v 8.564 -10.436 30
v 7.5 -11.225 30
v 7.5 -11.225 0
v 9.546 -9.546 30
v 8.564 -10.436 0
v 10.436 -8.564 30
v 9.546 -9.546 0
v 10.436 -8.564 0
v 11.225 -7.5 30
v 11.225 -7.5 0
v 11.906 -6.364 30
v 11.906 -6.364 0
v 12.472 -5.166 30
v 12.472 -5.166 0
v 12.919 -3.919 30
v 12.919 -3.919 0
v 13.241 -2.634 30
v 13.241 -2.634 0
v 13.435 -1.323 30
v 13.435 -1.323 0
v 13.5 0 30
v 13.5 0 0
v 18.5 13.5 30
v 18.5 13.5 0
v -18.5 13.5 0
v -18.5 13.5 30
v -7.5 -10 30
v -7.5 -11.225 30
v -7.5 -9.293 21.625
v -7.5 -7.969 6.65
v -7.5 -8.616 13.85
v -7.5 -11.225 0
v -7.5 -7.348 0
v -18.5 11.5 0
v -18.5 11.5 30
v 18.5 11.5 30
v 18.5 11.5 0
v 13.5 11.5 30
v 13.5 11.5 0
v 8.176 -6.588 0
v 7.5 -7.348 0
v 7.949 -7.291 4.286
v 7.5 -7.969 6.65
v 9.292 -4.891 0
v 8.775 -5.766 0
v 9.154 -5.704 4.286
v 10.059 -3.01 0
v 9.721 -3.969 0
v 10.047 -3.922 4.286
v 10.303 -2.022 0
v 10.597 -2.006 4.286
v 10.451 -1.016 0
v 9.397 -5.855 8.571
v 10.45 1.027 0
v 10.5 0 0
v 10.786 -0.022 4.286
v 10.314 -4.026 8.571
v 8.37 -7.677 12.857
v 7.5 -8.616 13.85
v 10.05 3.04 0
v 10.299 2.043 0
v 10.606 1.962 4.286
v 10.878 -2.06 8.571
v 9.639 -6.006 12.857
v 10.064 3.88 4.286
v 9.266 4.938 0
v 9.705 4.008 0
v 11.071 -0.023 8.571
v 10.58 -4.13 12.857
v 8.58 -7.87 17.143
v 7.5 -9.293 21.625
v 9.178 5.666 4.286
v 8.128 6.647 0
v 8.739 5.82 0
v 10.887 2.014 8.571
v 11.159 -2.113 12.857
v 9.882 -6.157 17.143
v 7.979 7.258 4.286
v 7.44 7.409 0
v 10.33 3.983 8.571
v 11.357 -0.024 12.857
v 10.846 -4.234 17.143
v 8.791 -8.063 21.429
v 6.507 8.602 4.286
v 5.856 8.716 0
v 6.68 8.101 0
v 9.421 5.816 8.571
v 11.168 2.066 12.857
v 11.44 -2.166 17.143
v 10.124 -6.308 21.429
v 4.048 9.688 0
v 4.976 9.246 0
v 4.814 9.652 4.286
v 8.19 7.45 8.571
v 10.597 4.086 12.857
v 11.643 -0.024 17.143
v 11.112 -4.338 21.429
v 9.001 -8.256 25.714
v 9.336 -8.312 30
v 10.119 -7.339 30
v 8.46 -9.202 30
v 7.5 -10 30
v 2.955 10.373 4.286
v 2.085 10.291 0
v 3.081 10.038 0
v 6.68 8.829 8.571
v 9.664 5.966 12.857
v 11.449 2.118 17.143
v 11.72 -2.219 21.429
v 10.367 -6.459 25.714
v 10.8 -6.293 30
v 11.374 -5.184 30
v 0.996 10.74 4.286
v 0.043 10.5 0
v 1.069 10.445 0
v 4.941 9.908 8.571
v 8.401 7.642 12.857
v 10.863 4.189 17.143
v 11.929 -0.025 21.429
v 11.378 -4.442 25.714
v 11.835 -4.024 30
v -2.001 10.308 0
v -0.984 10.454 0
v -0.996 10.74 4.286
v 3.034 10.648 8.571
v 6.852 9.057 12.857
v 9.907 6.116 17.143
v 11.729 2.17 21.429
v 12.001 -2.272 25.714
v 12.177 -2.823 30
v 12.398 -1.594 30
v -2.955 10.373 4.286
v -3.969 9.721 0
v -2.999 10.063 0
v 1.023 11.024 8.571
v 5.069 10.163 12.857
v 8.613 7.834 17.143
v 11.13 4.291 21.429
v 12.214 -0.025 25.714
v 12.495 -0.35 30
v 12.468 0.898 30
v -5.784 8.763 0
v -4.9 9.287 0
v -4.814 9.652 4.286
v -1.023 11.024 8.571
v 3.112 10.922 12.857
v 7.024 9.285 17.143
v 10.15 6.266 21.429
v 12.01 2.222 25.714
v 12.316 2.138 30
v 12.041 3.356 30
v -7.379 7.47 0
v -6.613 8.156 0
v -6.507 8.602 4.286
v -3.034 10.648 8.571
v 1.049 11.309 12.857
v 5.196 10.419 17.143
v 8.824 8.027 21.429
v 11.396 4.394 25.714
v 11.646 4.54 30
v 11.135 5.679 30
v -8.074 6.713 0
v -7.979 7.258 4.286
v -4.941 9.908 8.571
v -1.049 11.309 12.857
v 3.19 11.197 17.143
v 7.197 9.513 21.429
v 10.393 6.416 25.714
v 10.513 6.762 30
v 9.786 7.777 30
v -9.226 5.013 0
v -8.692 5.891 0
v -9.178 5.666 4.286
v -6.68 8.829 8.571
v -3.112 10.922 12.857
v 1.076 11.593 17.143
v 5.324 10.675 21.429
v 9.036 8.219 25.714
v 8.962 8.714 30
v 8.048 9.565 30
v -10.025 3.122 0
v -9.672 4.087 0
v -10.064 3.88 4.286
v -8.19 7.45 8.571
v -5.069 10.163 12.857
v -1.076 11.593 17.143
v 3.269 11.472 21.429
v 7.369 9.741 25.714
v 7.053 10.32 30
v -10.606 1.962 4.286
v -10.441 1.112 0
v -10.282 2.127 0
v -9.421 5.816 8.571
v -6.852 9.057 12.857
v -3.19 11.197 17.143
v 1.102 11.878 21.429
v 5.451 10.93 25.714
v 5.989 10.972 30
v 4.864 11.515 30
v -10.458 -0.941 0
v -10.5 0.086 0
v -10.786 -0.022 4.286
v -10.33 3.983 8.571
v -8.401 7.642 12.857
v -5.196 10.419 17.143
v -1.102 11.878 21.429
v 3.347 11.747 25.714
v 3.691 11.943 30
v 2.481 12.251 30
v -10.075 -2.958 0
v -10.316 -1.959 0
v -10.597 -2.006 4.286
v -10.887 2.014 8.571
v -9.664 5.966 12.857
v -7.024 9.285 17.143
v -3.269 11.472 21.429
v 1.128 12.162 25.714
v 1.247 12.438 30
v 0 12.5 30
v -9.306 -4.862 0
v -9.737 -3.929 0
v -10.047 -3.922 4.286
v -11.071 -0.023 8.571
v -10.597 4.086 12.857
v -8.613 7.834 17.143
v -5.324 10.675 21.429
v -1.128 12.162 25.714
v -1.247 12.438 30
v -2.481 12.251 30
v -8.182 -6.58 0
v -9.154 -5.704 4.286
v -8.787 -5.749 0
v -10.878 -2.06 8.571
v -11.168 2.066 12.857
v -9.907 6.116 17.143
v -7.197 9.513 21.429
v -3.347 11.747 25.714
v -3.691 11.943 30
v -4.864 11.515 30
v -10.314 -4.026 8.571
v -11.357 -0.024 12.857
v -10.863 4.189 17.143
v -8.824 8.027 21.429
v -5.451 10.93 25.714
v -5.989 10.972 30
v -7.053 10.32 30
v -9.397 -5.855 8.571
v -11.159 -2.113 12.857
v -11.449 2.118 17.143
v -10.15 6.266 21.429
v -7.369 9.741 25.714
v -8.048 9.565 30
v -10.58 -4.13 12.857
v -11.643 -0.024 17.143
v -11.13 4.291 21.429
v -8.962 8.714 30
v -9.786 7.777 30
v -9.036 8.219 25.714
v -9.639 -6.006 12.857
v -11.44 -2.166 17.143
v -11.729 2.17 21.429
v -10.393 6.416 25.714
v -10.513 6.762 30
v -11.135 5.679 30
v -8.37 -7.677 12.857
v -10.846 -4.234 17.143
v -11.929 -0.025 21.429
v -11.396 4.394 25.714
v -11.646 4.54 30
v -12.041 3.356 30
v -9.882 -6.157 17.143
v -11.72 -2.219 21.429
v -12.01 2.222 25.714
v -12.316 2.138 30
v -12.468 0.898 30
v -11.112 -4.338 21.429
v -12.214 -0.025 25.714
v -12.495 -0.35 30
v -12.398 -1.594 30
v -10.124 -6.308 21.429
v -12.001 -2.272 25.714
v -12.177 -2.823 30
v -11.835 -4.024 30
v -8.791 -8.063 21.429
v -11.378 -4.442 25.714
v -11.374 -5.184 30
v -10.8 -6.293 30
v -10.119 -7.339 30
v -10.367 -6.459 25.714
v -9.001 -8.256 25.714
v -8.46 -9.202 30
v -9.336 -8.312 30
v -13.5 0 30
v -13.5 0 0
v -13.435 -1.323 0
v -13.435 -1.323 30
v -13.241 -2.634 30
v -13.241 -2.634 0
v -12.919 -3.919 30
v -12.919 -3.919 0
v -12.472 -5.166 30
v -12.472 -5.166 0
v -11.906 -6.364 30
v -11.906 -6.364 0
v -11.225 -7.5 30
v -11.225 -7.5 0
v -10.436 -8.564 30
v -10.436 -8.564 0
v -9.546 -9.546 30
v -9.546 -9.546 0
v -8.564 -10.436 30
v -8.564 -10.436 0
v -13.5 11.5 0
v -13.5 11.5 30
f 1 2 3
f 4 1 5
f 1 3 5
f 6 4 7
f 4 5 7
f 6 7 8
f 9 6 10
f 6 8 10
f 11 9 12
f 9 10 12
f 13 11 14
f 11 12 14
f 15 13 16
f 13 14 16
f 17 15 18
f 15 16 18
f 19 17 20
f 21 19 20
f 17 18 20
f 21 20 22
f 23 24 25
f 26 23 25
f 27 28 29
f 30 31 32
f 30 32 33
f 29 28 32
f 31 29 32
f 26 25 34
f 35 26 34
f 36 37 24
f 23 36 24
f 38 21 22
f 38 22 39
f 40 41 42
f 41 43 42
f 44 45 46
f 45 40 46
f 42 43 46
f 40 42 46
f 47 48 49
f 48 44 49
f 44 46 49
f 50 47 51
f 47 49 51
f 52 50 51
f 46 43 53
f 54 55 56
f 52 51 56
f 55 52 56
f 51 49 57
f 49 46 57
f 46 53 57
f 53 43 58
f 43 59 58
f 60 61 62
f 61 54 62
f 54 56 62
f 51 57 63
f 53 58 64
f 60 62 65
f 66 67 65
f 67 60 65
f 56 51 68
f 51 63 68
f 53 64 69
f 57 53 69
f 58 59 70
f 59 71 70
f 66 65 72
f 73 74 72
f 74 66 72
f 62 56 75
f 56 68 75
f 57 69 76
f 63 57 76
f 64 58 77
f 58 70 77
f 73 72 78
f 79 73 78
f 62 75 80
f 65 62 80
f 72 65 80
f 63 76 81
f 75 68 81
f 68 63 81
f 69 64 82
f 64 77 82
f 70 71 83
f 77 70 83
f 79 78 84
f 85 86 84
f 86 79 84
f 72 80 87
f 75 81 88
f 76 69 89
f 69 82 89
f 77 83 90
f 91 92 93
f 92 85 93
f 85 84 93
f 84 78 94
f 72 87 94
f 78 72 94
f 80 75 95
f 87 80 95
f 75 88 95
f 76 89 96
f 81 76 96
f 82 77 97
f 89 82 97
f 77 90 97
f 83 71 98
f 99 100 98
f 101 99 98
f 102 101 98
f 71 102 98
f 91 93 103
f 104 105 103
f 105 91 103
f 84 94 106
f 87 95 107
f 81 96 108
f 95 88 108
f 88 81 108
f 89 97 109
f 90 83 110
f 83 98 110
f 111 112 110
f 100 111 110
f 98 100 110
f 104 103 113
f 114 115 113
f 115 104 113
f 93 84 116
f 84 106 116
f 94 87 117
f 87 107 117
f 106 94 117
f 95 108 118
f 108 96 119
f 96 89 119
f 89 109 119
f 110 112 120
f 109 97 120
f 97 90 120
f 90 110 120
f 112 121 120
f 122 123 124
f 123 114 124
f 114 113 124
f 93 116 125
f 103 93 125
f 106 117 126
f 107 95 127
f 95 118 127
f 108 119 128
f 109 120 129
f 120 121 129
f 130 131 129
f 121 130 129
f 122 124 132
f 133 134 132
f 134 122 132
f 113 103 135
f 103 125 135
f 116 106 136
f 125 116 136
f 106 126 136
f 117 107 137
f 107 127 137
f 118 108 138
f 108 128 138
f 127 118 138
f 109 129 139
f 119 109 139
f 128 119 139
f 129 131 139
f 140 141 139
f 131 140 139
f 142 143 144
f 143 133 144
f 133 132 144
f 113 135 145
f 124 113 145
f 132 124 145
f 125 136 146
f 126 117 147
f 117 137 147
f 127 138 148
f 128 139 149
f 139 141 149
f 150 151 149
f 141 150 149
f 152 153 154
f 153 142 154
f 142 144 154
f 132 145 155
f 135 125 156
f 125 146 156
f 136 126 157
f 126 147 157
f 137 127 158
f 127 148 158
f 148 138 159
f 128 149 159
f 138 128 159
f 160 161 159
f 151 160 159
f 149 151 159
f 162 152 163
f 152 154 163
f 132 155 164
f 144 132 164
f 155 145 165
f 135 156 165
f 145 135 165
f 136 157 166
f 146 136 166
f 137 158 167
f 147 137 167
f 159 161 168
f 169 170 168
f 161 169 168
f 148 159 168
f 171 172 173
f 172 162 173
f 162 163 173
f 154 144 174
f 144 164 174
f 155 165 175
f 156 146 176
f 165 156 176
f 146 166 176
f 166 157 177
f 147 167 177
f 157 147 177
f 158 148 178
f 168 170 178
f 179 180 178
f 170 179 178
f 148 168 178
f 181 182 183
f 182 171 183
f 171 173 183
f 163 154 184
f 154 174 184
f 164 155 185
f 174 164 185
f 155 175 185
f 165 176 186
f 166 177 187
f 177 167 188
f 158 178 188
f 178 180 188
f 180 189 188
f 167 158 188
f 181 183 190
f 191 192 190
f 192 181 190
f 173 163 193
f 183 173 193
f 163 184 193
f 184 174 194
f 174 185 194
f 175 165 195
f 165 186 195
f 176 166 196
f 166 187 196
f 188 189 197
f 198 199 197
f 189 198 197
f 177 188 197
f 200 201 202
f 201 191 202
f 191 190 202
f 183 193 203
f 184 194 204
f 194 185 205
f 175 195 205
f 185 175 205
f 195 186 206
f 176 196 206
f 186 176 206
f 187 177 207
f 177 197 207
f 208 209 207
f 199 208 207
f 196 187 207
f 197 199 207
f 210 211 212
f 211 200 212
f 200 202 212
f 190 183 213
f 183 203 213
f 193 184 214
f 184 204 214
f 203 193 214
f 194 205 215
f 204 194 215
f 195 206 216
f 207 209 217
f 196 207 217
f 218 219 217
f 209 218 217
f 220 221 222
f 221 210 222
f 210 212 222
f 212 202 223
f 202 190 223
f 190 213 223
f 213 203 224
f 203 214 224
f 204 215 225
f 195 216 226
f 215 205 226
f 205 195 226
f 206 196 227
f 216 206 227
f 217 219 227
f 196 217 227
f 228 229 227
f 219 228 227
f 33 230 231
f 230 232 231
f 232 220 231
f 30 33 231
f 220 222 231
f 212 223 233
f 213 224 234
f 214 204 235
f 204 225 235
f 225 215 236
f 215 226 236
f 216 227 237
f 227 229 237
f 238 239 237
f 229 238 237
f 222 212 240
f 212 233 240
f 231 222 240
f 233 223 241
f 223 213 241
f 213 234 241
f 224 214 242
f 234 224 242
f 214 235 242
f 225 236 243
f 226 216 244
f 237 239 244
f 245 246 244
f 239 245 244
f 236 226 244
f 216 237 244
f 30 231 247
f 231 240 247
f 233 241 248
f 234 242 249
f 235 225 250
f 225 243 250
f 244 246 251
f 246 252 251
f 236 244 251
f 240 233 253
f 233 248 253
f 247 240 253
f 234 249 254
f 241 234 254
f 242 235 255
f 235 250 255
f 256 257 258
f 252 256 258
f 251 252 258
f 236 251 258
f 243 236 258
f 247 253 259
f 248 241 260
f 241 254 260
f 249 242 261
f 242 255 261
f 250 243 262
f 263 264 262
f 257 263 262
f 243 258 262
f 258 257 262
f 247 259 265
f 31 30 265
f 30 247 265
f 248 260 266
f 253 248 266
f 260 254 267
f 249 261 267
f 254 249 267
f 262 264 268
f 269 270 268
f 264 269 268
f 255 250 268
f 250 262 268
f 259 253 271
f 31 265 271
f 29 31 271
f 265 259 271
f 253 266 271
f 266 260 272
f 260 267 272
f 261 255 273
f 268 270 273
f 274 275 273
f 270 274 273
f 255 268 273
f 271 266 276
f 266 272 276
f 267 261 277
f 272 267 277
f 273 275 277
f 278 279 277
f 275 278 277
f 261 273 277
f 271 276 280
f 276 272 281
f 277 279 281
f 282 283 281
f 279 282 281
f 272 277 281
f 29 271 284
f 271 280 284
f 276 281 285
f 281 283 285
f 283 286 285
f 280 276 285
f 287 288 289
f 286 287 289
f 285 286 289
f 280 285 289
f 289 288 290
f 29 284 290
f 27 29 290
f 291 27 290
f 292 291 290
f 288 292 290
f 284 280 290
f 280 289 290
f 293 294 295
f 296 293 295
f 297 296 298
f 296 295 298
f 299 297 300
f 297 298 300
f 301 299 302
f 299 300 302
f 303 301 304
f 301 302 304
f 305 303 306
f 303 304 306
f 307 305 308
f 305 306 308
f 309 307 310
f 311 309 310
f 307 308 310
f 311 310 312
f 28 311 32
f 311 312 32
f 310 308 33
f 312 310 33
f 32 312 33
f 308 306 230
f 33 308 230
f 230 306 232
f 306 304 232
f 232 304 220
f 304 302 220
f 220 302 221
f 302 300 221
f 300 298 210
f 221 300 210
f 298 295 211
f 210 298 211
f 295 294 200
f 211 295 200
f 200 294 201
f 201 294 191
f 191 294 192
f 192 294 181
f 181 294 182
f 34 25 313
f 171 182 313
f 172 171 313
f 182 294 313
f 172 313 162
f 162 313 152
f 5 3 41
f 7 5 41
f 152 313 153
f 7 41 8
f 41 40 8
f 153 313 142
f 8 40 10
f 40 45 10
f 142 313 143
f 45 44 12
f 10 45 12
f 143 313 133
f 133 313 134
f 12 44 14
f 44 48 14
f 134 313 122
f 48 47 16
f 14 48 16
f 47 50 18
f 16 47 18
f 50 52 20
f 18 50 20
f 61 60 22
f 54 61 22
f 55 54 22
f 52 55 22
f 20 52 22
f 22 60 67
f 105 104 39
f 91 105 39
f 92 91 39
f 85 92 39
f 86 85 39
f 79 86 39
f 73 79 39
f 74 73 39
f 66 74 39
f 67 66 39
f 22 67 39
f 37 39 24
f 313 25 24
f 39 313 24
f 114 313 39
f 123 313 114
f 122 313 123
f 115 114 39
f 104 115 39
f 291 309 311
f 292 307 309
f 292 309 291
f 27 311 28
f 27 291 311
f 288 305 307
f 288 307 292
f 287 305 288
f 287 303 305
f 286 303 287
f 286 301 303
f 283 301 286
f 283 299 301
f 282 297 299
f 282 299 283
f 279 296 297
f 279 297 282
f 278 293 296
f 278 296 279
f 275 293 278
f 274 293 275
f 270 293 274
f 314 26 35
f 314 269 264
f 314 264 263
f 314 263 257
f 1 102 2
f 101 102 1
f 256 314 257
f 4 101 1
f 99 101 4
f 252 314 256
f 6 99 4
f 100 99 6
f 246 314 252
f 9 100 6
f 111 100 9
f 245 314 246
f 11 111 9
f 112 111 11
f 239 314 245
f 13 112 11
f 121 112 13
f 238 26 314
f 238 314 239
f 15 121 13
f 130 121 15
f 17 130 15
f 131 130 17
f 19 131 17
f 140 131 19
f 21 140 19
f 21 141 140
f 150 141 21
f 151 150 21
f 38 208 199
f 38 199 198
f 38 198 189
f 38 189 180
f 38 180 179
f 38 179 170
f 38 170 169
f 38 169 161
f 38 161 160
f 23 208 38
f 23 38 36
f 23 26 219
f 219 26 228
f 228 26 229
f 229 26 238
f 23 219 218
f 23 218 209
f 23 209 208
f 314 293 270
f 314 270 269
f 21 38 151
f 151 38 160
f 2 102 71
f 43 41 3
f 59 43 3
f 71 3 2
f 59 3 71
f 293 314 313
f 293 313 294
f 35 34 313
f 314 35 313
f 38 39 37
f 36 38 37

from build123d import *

# Parameters (mm, degrees)
F1_DEPTH = 30


with BuildPart() as f1:
    # F0 (on Top) → F1 (new body)
    with BuildSketch(Plane.XY):
        with BuildLine():
            ThreePointArc((-13.5, 0), (-9.545942, 9.545942), (0, 13.5))
            Line((0, 13.5), (-13.5, 13.5))
            Line((-13.5, 13.5), (-18.5, 13.5))
            Line((-18.5, 13.5), (-18.5, 11.5))
            Line((-18.5, 11.5), (-13.5, 11.5))
            Line((-13.5, 11.5), (-13.5, 0))
        make_face()
        with BuildLine():
            Line((13.5, 0), (13.5, 11.5))
            Line((13.5, 11.5), (18.5, 11.5))
            Line((18.5, 11.5), (18.5, 13.5))
            Line((18.5, 13.5), (13.5, 13.5))
            Line((13.5, 13.5), (0, 13.5))
            ThreePointArc((0, 13.5), (9.545942, 9.545942), (13.5, 0))
        make_face()
        with BuildLine():
            ThreePointArc((7.5, -11.224972), (11.905881, -6.363961), (13.5, 0))
            ThreePointArc((13.5, 0), (9.545942, 9.545942), (0, 13.5))
            ThreePointArc((0, 13.5), (-9.545942, 9.545942), (-13.5, 0))
            ThreePointArc((-13.5, 0), (-11.905881, -6.363961), (-7.5, -11.224972))
            Line((-7.5, -11.224972), (-7.5, -7.348469))
            ThreePointArc((-7.5, -7.348469), (-3.968627, 9.721111), (10.5, 0))
            ThreePointArc((10.5, 0), (9.721111, -3.968627), (7.5, -7.348469))
            Line((7.5, -7.348469), (7.5, -11.224972))
        make_face()
    extrude(amount=F1_DEPTH)

    # F2 (on Front) → F3 (revolve, cut)
    with BuildSketch(Plane.XZ):
        Polygon((0, 0), (10.5, 0), (12.5, 30), (0, 30), align=None)
    revolve(axis=Axis((0, 0, 15), (0, 0, 1)), mode=Mode.SUBTRACT)


solid = f1.part
